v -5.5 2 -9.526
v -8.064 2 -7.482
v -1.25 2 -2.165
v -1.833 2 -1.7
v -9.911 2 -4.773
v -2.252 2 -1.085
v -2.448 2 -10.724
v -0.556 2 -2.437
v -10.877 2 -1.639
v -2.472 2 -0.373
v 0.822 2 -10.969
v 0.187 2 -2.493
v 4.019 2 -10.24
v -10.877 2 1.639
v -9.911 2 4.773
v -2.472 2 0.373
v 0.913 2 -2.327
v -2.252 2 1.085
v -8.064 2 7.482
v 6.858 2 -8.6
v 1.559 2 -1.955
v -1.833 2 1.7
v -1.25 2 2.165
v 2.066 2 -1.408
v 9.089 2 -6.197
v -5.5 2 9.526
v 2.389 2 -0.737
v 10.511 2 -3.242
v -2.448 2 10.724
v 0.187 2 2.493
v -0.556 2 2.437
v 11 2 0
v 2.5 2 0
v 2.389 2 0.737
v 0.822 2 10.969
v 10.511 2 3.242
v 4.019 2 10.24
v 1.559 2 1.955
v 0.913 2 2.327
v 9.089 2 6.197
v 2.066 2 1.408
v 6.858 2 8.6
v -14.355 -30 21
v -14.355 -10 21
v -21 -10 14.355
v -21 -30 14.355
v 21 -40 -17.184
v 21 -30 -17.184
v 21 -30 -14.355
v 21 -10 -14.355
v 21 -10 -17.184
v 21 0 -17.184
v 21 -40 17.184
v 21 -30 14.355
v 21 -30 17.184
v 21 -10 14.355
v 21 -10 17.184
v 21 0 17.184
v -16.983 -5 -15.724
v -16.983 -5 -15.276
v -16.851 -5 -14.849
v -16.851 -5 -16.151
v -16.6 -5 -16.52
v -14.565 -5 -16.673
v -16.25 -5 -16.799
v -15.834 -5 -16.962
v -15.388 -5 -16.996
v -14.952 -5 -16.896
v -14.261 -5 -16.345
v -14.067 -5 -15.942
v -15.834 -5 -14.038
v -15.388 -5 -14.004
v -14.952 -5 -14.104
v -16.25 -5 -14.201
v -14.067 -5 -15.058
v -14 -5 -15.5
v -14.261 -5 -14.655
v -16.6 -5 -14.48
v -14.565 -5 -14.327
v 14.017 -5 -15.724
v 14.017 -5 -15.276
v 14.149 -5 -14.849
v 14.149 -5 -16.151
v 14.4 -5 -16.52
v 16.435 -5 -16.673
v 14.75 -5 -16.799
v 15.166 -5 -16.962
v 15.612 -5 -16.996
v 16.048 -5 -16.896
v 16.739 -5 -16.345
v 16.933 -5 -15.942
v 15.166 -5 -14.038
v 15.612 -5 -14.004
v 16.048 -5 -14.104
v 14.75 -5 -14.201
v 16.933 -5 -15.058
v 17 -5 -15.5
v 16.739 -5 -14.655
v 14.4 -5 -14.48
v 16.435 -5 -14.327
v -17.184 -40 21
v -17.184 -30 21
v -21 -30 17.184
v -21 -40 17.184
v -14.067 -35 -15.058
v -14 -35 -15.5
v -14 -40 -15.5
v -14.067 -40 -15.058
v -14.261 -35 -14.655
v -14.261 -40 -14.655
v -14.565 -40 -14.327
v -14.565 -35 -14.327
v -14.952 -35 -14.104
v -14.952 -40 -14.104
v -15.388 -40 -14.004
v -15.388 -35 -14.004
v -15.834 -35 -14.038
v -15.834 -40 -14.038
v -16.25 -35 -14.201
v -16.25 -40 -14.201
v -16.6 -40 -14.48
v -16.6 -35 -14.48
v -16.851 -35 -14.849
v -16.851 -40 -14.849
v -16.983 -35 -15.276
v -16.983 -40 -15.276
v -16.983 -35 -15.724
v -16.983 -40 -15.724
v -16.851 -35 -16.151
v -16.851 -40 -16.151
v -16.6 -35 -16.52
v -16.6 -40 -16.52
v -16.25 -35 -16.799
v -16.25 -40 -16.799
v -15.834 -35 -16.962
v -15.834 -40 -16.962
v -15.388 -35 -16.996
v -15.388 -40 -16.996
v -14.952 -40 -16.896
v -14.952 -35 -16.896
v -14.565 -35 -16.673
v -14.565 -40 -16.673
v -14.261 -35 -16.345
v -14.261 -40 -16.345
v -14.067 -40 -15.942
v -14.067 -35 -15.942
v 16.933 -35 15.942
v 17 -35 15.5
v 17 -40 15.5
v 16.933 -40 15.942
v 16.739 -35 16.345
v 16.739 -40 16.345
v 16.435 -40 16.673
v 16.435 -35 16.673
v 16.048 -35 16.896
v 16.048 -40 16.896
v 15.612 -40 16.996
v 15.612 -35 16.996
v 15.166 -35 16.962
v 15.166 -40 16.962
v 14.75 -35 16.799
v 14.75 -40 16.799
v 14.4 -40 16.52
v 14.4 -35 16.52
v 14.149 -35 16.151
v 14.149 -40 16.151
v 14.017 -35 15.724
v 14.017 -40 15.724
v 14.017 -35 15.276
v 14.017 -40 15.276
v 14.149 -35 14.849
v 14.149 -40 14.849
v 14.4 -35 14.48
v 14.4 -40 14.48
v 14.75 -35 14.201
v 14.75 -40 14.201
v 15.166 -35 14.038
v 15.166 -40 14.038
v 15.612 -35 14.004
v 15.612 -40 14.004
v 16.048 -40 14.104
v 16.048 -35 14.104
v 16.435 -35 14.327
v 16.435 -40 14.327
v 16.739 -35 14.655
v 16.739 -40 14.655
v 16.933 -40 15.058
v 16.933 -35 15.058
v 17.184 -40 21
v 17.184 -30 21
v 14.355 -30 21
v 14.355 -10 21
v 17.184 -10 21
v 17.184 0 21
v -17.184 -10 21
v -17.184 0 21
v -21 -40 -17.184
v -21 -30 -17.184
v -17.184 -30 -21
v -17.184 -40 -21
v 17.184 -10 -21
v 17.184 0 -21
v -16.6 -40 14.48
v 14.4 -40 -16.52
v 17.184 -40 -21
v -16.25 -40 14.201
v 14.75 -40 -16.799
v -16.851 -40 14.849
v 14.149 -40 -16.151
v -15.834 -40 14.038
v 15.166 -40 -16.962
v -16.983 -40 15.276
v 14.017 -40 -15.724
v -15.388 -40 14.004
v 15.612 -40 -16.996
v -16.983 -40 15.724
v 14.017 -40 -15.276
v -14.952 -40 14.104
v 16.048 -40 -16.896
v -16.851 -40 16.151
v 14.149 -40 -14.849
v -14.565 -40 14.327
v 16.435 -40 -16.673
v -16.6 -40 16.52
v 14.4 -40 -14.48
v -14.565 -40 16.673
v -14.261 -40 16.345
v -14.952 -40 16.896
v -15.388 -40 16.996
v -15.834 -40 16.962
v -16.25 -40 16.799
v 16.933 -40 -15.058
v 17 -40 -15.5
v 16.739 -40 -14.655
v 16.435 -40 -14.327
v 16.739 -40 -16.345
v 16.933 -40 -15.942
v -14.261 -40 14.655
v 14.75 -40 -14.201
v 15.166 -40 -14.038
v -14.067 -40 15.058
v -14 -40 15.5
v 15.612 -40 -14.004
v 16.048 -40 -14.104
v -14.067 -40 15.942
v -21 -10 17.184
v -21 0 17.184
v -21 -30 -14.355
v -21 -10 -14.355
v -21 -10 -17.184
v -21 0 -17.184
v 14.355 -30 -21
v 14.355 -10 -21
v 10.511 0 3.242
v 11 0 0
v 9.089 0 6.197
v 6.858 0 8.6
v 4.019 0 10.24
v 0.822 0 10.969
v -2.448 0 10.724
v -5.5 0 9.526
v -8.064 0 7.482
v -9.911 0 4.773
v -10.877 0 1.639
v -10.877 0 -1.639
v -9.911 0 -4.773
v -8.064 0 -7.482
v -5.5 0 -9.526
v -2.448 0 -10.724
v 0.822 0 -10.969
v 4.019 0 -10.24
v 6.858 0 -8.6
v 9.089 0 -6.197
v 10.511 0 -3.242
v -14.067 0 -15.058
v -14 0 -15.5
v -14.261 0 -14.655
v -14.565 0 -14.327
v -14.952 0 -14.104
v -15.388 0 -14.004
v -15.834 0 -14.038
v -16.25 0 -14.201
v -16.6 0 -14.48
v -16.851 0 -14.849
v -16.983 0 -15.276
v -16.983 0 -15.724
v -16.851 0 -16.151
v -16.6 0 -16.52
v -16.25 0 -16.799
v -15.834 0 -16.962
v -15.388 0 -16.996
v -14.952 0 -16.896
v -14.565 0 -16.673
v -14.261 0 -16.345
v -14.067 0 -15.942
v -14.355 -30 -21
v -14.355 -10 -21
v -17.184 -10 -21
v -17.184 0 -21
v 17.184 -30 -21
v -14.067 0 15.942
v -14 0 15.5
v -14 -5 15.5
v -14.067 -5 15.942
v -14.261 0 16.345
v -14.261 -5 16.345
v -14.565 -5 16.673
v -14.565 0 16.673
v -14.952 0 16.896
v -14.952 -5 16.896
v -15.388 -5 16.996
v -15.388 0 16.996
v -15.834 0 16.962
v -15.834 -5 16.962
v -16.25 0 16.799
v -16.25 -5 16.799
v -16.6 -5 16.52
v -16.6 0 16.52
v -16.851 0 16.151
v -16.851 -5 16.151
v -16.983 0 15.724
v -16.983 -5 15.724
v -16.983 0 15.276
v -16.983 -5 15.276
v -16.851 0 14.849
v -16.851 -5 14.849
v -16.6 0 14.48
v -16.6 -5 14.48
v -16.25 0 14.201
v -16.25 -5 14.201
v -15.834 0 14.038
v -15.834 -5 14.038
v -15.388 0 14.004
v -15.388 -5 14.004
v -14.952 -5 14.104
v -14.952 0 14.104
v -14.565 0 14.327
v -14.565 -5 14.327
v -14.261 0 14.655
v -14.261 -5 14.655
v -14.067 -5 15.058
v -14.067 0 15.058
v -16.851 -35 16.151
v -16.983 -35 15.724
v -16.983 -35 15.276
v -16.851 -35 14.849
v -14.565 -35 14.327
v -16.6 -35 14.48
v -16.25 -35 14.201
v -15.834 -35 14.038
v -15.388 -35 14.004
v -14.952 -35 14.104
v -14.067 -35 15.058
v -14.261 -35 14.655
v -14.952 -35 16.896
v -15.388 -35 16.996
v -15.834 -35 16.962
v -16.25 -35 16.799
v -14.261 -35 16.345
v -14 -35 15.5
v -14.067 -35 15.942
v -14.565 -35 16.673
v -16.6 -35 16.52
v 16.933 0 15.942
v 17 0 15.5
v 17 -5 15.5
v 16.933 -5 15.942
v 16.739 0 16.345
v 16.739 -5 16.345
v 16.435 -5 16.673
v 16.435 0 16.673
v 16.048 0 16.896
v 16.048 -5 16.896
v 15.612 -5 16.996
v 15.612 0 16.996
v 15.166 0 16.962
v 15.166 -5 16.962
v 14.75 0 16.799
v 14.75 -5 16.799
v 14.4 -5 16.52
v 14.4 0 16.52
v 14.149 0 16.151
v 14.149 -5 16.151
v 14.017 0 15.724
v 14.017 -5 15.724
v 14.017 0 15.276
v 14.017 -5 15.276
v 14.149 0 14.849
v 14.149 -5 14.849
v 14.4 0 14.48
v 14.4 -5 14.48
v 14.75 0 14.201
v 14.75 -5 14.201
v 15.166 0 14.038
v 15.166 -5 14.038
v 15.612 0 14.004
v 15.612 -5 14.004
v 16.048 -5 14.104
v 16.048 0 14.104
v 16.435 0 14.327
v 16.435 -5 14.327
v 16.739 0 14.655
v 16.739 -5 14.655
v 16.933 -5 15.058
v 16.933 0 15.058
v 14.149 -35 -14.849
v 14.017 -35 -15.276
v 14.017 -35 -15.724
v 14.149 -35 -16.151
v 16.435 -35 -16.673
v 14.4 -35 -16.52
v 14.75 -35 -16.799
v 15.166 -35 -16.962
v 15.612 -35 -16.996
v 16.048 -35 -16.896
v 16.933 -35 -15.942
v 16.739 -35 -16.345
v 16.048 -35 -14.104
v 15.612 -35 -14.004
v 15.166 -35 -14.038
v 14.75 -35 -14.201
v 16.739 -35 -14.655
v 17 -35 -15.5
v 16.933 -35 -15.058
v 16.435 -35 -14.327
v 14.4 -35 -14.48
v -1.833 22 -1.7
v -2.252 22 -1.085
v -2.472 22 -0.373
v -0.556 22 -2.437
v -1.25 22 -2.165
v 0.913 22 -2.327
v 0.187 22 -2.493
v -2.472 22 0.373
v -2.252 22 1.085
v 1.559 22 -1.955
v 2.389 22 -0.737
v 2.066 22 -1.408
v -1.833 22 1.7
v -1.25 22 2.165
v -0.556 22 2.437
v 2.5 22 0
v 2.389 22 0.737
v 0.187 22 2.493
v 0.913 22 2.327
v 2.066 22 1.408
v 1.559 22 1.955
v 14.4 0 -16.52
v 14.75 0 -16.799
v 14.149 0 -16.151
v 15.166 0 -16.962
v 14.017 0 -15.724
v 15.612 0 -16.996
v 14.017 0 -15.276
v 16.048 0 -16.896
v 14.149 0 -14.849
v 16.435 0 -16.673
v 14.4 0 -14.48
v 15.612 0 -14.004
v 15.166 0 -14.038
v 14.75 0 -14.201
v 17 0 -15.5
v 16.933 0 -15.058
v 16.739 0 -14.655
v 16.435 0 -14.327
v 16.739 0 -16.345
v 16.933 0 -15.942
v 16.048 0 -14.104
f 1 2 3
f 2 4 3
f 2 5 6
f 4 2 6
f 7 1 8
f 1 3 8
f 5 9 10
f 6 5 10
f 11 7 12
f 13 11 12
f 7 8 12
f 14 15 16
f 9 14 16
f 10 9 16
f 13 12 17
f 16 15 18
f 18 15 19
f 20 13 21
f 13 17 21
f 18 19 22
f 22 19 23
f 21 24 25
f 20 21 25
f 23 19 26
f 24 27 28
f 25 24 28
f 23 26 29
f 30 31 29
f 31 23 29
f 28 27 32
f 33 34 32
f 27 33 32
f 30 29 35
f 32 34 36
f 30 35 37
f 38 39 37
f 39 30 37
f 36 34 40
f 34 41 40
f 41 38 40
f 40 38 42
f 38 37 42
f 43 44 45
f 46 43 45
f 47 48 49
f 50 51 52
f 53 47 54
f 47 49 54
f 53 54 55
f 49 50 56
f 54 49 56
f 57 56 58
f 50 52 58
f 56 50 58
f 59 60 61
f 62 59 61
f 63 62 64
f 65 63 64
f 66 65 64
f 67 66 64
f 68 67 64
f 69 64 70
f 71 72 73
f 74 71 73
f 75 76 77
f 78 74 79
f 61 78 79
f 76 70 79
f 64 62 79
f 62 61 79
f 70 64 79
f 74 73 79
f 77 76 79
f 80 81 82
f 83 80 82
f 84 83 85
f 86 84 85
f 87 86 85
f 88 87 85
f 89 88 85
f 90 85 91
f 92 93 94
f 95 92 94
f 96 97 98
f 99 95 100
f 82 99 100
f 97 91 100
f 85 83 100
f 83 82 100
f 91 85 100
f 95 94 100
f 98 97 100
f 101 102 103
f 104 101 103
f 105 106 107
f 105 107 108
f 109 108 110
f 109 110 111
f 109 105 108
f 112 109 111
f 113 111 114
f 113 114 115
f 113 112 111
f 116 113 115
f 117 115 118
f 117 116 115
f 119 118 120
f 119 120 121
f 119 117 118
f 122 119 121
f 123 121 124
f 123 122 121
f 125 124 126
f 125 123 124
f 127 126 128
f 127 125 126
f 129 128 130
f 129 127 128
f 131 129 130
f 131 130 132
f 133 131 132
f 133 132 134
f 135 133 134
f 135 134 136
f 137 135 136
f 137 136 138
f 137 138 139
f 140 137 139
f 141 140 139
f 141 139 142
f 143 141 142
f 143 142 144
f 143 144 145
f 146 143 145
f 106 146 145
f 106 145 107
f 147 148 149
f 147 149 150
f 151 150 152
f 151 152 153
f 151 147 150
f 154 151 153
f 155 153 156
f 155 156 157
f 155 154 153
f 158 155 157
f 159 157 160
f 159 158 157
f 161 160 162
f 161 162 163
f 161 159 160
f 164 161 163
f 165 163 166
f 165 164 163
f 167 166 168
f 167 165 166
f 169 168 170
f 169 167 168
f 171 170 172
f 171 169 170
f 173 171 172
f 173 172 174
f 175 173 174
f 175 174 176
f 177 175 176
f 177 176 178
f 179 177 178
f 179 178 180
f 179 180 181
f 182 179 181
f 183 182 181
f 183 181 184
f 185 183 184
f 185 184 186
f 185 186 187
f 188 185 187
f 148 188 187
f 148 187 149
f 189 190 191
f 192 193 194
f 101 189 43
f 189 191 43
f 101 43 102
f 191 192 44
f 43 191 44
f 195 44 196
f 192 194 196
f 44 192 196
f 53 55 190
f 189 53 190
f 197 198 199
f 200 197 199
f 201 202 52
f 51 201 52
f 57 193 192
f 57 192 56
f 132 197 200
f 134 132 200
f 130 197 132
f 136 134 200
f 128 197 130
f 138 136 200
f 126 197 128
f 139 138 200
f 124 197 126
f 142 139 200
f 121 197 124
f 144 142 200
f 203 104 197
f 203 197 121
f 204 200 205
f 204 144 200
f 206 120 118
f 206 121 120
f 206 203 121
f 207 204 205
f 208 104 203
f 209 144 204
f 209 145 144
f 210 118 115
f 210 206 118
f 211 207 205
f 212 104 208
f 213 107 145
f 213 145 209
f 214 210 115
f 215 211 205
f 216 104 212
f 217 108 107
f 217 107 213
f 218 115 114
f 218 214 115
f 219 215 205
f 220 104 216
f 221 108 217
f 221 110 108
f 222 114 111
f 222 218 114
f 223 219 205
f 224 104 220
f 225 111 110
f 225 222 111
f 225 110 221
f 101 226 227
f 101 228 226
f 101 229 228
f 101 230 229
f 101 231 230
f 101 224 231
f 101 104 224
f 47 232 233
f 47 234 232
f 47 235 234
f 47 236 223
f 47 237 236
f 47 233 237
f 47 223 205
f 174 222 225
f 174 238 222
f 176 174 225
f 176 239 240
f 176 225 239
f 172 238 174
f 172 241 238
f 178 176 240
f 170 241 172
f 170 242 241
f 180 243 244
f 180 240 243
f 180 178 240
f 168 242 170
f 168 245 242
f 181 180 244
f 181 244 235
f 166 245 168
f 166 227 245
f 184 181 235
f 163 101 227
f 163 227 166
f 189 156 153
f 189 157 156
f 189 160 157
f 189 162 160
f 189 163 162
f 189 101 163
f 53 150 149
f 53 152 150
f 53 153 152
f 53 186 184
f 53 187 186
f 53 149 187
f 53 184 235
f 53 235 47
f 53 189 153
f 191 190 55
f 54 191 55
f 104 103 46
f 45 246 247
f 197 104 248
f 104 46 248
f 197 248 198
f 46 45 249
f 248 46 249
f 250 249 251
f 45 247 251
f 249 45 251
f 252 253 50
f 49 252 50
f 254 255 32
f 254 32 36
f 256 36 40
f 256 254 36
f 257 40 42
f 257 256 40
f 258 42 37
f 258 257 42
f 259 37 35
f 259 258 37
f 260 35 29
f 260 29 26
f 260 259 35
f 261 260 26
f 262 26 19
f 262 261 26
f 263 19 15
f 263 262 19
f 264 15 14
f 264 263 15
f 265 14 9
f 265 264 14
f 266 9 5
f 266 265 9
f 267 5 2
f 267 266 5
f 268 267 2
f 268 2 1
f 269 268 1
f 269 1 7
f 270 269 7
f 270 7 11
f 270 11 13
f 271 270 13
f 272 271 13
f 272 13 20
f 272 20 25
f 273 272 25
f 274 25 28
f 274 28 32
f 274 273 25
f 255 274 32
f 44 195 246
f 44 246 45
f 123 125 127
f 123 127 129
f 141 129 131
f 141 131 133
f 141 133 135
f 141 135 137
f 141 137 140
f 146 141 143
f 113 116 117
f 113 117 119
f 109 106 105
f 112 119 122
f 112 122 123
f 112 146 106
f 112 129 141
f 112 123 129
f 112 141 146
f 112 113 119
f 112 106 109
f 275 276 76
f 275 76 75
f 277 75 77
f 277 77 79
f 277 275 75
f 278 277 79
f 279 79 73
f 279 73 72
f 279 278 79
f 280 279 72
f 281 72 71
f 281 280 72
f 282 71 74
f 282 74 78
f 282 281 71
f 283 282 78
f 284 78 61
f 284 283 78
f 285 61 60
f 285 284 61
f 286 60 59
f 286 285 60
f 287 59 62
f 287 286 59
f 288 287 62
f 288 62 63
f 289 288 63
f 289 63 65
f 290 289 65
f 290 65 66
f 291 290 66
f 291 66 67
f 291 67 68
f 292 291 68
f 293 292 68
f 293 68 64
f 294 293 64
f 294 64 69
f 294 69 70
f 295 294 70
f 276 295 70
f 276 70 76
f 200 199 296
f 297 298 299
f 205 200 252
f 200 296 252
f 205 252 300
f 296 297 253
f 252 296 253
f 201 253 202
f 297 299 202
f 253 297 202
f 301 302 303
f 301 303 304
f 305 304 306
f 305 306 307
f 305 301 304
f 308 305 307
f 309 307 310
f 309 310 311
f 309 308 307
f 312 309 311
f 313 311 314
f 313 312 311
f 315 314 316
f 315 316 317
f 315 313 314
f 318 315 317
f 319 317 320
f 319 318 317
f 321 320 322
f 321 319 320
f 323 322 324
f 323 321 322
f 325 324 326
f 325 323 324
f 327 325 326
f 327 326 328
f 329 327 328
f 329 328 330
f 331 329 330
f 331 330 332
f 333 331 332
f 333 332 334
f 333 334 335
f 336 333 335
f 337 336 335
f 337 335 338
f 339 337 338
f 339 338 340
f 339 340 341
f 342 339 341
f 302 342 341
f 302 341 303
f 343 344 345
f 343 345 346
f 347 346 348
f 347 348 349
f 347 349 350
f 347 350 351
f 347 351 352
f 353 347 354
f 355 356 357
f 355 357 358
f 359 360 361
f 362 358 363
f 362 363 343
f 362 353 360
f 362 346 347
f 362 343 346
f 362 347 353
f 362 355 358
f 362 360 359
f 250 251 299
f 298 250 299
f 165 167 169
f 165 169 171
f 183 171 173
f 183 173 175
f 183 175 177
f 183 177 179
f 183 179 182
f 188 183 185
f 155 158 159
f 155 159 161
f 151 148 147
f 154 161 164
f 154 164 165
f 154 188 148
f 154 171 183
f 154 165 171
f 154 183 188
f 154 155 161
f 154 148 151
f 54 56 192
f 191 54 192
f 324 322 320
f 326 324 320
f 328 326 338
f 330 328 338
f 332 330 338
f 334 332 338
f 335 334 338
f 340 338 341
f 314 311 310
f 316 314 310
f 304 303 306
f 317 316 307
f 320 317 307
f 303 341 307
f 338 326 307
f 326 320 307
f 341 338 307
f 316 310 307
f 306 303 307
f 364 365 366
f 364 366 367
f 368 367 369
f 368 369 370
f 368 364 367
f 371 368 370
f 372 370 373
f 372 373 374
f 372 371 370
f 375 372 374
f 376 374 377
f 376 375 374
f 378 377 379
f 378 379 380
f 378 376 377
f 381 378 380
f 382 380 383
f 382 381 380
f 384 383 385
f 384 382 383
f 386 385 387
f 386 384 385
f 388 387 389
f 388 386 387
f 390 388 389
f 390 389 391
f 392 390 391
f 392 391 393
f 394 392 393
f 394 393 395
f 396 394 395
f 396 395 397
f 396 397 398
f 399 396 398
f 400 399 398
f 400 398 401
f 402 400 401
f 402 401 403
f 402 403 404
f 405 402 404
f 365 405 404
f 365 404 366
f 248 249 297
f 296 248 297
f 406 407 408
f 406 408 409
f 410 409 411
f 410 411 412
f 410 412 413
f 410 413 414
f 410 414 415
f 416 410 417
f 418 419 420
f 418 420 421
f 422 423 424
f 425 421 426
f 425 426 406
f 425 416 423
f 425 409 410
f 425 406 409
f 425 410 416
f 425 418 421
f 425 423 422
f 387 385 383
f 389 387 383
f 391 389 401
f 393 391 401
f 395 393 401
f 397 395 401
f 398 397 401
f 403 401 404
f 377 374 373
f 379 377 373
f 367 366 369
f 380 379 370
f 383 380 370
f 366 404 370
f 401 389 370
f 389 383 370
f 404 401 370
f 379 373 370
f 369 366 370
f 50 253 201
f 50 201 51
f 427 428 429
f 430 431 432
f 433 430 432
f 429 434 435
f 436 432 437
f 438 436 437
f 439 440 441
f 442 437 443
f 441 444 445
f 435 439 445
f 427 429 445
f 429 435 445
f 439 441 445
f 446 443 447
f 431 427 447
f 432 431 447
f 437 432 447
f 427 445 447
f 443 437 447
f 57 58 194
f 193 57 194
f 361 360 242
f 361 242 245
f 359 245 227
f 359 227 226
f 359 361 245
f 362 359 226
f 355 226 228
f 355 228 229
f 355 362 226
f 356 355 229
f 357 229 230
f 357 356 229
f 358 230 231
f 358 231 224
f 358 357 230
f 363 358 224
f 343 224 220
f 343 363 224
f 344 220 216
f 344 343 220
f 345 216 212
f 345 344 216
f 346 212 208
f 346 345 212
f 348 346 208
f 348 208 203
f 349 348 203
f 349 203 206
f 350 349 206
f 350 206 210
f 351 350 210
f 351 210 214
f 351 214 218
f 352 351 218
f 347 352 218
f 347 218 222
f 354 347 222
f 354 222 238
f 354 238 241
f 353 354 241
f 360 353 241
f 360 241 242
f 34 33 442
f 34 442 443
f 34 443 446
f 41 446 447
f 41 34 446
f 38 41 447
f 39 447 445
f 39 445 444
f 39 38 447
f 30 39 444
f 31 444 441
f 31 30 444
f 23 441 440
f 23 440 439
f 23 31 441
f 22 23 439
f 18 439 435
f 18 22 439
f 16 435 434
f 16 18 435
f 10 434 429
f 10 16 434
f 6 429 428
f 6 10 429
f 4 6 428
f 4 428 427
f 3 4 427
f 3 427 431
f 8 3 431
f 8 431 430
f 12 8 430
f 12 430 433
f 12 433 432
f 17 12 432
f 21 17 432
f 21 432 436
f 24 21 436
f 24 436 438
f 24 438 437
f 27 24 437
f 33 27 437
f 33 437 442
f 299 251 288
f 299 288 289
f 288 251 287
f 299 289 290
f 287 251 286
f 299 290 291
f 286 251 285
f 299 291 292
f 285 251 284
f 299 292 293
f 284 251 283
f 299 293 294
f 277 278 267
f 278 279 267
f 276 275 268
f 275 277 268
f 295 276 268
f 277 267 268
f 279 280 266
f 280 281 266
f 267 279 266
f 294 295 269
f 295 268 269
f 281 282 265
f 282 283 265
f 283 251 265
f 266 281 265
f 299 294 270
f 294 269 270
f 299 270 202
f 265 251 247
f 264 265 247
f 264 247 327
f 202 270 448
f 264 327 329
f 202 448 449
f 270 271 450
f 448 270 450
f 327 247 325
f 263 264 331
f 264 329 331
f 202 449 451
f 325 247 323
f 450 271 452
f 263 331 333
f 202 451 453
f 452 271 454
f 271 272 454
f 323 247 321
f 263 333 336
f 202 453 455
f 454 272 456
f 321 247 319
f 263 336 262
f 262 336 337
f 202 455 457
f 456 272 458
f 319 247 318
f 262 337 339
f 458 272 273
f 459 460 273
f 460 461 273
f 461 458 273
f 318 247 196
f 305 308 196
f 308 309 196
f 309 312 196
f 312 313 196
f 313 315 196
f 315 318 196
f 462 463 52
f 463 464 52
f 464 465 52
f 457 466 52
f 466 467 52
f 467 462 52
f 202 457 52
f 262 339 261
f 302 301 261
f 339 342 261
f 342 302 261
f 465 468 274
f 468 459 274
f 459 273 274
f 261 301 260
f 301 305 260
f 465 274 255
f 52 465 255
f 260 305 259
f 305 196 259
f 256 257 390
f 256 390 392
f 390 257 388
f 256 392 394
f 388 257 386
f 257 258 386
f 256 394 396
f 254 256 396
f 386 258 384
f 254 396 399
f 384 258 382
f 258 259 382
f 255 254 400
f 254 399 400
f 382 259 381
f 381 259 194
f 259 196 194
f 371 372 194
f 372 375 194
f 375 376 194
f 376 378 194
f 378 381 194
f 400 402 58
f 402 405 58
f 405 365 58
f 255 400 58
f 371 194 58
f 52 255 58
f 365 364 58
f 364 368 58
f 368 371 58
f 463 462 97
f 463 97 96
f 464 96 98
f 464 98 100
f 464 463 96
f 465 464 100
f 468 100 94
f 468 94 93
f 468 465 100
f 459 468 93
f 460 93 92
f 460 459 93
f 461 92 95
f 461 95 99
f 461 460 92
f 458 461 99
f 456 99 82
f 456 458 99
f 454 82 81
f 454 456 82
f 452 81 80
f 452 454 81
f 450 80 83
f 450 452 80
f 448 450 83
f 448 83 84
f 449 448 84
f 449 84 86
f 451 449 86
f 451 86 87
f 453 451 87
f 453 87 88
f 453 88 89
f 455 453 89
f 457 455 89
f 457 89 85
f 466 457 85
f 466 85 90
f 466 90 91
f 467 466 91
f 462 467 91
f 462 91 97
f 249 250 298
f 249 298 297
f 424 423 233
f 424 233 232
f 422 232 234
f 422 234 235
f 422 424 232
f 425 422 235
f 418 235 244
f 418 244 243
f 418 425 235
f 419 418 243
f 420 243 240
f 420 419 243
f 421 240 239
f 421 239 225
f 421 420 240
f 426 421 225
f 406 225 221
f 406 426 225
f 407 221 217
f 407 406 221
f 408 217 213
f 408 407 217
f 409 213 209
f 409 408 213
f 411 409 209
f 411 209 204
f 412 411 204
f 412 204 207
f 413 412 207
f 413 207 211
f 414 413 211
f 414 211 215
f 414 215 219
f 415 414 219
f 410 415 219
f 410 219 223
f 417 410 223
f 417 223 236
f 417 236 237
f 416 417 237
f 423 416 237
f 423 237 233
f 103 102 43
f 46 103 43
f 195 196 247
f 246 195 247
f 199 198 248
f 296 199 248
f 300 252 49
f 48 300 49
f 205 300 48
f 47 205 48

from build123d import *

# Parameters (mm, degrees)
F0_R     = 1.5
F0_R_2   = 11
F0_R_3   = 2.5
F1_DEPTH = 40
F2_START = 30
F2_DEPTH = 10
F3_DEPTH = 10
F4_DEPTH = 2
F5_DEPTH = 22
F6_START = 5
F6_DEPTH = 30


with BuildPart() as f1:
    # F0 (on Front) → F1 (new body)
    with BuildSketch(Plane.XZ):
        Polygon((-14.3553390593, 21), (-21, 14.3553390593), (-21, -14.3553390593), (-14.3553390593, -21), (14.3553390593, -21), (21, -14.3553390593), (21, 14.3553390593), (14.3553390593, 21), align=None)
        with Locations((-15.5, -15.5)):
            Circle(F0_R, mode=Mode.SUBTRACT)
        with Locations((15.5, -15.5)):
            Circle(F0_R, mode=Mode.SUBTRACT)
        with Locations((-15.5, 15.5)):
            Circle(F0_R, mode=Mode.SUBTRACT)
        Circle(F0_R_2, mode=Mode.SUBTRACT)
        with Locations((15.5, 15.5)):
            Circle(F0_R, mode=Mode.SUBTRACT)
        Circle(F0_R_2)
        Circle(F0_R_3, mode=Mode.SUBTRACT)
        Circle(F0_R_3)
    extrude(amount=F1_DEPTH)

    # F0 (on Front) → F2 (join)
    with BuildSketch(Plane.XZ.offset(F2_START)):
        Polygon((-17.1837661841, 21), (-21, 17.1837661841), (-21, 14.3553390593), (-14.3553390593, 21), align=None)
        Polygon((-14.3553390593, -21), (-21, -14.3553390593), (-21, -17.1837661841), (-17.1837661841, -21), align=None)
        Polygon((21, -14.3553390593), (14.3553390593, -21), (17.1837661841, -21), (21, -17.1837661841), align=None)
        Polygon((17.1837661841, 21), (14.3553390593, 21), (21, 14.3553390593), (21, 17.1837661841), align=None)
    extrude(amount=F2_DEPTH)

    # F0 (on Front) → F3 (join)
    with BuildSketch(Plane.XZ):
        Polygon((17.1837661841, 21), (14.3553390593, 21), (21, 14.3553390593), (21, 17.1837661841), align=None)
        Polygon((-17.1837661841, 21), (-21, 17.1837661841), (-21, 14.3553390593), (-14.3553390593, 21), align=None)
        Polygon((-14.3553390593, -21), (-21, -14.3553390593), (-21, -17.1837661841), (-17.1837661841, -21), align=None)
        Polygon((21, -14.3553390593), (14.3553390593, -21), (17.1837661841, -21), (21, -17.1837661841), align=None)
    extrude(amount=F3_DEPTH)

    # F0 (on Front) → F4 (join)
    with BuildSketch(Plane.XZ):
        Circle(F0_R_2)
        Circle(F0_R_3, mode=Mode.SUBTRACT)
    extrude(amount=-F4_DEPTH)

    # F0 (on Front) → F5 (join)
    with BuildSketch(Plane.XZ):
        Circle(F0_R_3)
    extrude(amount=-F5_DEPTH)

    # F0 (on Front) → F6 (join)
    with BuildSketch(Plane.XZ.offset(F6_START)):
        with Locations((15.5, 15.5)):
            Circle(F0_R)
        with Locations((-15.5, 15.5)):
            Circle(F0_R)
        with Locations((-15.5, -15.5)):
            Circle(F0_R)
        with Locations((15.5, -15.5)):
            Circle(F0_R)
    extrude(amount=F6_DEPTH)


solid = f1.part
